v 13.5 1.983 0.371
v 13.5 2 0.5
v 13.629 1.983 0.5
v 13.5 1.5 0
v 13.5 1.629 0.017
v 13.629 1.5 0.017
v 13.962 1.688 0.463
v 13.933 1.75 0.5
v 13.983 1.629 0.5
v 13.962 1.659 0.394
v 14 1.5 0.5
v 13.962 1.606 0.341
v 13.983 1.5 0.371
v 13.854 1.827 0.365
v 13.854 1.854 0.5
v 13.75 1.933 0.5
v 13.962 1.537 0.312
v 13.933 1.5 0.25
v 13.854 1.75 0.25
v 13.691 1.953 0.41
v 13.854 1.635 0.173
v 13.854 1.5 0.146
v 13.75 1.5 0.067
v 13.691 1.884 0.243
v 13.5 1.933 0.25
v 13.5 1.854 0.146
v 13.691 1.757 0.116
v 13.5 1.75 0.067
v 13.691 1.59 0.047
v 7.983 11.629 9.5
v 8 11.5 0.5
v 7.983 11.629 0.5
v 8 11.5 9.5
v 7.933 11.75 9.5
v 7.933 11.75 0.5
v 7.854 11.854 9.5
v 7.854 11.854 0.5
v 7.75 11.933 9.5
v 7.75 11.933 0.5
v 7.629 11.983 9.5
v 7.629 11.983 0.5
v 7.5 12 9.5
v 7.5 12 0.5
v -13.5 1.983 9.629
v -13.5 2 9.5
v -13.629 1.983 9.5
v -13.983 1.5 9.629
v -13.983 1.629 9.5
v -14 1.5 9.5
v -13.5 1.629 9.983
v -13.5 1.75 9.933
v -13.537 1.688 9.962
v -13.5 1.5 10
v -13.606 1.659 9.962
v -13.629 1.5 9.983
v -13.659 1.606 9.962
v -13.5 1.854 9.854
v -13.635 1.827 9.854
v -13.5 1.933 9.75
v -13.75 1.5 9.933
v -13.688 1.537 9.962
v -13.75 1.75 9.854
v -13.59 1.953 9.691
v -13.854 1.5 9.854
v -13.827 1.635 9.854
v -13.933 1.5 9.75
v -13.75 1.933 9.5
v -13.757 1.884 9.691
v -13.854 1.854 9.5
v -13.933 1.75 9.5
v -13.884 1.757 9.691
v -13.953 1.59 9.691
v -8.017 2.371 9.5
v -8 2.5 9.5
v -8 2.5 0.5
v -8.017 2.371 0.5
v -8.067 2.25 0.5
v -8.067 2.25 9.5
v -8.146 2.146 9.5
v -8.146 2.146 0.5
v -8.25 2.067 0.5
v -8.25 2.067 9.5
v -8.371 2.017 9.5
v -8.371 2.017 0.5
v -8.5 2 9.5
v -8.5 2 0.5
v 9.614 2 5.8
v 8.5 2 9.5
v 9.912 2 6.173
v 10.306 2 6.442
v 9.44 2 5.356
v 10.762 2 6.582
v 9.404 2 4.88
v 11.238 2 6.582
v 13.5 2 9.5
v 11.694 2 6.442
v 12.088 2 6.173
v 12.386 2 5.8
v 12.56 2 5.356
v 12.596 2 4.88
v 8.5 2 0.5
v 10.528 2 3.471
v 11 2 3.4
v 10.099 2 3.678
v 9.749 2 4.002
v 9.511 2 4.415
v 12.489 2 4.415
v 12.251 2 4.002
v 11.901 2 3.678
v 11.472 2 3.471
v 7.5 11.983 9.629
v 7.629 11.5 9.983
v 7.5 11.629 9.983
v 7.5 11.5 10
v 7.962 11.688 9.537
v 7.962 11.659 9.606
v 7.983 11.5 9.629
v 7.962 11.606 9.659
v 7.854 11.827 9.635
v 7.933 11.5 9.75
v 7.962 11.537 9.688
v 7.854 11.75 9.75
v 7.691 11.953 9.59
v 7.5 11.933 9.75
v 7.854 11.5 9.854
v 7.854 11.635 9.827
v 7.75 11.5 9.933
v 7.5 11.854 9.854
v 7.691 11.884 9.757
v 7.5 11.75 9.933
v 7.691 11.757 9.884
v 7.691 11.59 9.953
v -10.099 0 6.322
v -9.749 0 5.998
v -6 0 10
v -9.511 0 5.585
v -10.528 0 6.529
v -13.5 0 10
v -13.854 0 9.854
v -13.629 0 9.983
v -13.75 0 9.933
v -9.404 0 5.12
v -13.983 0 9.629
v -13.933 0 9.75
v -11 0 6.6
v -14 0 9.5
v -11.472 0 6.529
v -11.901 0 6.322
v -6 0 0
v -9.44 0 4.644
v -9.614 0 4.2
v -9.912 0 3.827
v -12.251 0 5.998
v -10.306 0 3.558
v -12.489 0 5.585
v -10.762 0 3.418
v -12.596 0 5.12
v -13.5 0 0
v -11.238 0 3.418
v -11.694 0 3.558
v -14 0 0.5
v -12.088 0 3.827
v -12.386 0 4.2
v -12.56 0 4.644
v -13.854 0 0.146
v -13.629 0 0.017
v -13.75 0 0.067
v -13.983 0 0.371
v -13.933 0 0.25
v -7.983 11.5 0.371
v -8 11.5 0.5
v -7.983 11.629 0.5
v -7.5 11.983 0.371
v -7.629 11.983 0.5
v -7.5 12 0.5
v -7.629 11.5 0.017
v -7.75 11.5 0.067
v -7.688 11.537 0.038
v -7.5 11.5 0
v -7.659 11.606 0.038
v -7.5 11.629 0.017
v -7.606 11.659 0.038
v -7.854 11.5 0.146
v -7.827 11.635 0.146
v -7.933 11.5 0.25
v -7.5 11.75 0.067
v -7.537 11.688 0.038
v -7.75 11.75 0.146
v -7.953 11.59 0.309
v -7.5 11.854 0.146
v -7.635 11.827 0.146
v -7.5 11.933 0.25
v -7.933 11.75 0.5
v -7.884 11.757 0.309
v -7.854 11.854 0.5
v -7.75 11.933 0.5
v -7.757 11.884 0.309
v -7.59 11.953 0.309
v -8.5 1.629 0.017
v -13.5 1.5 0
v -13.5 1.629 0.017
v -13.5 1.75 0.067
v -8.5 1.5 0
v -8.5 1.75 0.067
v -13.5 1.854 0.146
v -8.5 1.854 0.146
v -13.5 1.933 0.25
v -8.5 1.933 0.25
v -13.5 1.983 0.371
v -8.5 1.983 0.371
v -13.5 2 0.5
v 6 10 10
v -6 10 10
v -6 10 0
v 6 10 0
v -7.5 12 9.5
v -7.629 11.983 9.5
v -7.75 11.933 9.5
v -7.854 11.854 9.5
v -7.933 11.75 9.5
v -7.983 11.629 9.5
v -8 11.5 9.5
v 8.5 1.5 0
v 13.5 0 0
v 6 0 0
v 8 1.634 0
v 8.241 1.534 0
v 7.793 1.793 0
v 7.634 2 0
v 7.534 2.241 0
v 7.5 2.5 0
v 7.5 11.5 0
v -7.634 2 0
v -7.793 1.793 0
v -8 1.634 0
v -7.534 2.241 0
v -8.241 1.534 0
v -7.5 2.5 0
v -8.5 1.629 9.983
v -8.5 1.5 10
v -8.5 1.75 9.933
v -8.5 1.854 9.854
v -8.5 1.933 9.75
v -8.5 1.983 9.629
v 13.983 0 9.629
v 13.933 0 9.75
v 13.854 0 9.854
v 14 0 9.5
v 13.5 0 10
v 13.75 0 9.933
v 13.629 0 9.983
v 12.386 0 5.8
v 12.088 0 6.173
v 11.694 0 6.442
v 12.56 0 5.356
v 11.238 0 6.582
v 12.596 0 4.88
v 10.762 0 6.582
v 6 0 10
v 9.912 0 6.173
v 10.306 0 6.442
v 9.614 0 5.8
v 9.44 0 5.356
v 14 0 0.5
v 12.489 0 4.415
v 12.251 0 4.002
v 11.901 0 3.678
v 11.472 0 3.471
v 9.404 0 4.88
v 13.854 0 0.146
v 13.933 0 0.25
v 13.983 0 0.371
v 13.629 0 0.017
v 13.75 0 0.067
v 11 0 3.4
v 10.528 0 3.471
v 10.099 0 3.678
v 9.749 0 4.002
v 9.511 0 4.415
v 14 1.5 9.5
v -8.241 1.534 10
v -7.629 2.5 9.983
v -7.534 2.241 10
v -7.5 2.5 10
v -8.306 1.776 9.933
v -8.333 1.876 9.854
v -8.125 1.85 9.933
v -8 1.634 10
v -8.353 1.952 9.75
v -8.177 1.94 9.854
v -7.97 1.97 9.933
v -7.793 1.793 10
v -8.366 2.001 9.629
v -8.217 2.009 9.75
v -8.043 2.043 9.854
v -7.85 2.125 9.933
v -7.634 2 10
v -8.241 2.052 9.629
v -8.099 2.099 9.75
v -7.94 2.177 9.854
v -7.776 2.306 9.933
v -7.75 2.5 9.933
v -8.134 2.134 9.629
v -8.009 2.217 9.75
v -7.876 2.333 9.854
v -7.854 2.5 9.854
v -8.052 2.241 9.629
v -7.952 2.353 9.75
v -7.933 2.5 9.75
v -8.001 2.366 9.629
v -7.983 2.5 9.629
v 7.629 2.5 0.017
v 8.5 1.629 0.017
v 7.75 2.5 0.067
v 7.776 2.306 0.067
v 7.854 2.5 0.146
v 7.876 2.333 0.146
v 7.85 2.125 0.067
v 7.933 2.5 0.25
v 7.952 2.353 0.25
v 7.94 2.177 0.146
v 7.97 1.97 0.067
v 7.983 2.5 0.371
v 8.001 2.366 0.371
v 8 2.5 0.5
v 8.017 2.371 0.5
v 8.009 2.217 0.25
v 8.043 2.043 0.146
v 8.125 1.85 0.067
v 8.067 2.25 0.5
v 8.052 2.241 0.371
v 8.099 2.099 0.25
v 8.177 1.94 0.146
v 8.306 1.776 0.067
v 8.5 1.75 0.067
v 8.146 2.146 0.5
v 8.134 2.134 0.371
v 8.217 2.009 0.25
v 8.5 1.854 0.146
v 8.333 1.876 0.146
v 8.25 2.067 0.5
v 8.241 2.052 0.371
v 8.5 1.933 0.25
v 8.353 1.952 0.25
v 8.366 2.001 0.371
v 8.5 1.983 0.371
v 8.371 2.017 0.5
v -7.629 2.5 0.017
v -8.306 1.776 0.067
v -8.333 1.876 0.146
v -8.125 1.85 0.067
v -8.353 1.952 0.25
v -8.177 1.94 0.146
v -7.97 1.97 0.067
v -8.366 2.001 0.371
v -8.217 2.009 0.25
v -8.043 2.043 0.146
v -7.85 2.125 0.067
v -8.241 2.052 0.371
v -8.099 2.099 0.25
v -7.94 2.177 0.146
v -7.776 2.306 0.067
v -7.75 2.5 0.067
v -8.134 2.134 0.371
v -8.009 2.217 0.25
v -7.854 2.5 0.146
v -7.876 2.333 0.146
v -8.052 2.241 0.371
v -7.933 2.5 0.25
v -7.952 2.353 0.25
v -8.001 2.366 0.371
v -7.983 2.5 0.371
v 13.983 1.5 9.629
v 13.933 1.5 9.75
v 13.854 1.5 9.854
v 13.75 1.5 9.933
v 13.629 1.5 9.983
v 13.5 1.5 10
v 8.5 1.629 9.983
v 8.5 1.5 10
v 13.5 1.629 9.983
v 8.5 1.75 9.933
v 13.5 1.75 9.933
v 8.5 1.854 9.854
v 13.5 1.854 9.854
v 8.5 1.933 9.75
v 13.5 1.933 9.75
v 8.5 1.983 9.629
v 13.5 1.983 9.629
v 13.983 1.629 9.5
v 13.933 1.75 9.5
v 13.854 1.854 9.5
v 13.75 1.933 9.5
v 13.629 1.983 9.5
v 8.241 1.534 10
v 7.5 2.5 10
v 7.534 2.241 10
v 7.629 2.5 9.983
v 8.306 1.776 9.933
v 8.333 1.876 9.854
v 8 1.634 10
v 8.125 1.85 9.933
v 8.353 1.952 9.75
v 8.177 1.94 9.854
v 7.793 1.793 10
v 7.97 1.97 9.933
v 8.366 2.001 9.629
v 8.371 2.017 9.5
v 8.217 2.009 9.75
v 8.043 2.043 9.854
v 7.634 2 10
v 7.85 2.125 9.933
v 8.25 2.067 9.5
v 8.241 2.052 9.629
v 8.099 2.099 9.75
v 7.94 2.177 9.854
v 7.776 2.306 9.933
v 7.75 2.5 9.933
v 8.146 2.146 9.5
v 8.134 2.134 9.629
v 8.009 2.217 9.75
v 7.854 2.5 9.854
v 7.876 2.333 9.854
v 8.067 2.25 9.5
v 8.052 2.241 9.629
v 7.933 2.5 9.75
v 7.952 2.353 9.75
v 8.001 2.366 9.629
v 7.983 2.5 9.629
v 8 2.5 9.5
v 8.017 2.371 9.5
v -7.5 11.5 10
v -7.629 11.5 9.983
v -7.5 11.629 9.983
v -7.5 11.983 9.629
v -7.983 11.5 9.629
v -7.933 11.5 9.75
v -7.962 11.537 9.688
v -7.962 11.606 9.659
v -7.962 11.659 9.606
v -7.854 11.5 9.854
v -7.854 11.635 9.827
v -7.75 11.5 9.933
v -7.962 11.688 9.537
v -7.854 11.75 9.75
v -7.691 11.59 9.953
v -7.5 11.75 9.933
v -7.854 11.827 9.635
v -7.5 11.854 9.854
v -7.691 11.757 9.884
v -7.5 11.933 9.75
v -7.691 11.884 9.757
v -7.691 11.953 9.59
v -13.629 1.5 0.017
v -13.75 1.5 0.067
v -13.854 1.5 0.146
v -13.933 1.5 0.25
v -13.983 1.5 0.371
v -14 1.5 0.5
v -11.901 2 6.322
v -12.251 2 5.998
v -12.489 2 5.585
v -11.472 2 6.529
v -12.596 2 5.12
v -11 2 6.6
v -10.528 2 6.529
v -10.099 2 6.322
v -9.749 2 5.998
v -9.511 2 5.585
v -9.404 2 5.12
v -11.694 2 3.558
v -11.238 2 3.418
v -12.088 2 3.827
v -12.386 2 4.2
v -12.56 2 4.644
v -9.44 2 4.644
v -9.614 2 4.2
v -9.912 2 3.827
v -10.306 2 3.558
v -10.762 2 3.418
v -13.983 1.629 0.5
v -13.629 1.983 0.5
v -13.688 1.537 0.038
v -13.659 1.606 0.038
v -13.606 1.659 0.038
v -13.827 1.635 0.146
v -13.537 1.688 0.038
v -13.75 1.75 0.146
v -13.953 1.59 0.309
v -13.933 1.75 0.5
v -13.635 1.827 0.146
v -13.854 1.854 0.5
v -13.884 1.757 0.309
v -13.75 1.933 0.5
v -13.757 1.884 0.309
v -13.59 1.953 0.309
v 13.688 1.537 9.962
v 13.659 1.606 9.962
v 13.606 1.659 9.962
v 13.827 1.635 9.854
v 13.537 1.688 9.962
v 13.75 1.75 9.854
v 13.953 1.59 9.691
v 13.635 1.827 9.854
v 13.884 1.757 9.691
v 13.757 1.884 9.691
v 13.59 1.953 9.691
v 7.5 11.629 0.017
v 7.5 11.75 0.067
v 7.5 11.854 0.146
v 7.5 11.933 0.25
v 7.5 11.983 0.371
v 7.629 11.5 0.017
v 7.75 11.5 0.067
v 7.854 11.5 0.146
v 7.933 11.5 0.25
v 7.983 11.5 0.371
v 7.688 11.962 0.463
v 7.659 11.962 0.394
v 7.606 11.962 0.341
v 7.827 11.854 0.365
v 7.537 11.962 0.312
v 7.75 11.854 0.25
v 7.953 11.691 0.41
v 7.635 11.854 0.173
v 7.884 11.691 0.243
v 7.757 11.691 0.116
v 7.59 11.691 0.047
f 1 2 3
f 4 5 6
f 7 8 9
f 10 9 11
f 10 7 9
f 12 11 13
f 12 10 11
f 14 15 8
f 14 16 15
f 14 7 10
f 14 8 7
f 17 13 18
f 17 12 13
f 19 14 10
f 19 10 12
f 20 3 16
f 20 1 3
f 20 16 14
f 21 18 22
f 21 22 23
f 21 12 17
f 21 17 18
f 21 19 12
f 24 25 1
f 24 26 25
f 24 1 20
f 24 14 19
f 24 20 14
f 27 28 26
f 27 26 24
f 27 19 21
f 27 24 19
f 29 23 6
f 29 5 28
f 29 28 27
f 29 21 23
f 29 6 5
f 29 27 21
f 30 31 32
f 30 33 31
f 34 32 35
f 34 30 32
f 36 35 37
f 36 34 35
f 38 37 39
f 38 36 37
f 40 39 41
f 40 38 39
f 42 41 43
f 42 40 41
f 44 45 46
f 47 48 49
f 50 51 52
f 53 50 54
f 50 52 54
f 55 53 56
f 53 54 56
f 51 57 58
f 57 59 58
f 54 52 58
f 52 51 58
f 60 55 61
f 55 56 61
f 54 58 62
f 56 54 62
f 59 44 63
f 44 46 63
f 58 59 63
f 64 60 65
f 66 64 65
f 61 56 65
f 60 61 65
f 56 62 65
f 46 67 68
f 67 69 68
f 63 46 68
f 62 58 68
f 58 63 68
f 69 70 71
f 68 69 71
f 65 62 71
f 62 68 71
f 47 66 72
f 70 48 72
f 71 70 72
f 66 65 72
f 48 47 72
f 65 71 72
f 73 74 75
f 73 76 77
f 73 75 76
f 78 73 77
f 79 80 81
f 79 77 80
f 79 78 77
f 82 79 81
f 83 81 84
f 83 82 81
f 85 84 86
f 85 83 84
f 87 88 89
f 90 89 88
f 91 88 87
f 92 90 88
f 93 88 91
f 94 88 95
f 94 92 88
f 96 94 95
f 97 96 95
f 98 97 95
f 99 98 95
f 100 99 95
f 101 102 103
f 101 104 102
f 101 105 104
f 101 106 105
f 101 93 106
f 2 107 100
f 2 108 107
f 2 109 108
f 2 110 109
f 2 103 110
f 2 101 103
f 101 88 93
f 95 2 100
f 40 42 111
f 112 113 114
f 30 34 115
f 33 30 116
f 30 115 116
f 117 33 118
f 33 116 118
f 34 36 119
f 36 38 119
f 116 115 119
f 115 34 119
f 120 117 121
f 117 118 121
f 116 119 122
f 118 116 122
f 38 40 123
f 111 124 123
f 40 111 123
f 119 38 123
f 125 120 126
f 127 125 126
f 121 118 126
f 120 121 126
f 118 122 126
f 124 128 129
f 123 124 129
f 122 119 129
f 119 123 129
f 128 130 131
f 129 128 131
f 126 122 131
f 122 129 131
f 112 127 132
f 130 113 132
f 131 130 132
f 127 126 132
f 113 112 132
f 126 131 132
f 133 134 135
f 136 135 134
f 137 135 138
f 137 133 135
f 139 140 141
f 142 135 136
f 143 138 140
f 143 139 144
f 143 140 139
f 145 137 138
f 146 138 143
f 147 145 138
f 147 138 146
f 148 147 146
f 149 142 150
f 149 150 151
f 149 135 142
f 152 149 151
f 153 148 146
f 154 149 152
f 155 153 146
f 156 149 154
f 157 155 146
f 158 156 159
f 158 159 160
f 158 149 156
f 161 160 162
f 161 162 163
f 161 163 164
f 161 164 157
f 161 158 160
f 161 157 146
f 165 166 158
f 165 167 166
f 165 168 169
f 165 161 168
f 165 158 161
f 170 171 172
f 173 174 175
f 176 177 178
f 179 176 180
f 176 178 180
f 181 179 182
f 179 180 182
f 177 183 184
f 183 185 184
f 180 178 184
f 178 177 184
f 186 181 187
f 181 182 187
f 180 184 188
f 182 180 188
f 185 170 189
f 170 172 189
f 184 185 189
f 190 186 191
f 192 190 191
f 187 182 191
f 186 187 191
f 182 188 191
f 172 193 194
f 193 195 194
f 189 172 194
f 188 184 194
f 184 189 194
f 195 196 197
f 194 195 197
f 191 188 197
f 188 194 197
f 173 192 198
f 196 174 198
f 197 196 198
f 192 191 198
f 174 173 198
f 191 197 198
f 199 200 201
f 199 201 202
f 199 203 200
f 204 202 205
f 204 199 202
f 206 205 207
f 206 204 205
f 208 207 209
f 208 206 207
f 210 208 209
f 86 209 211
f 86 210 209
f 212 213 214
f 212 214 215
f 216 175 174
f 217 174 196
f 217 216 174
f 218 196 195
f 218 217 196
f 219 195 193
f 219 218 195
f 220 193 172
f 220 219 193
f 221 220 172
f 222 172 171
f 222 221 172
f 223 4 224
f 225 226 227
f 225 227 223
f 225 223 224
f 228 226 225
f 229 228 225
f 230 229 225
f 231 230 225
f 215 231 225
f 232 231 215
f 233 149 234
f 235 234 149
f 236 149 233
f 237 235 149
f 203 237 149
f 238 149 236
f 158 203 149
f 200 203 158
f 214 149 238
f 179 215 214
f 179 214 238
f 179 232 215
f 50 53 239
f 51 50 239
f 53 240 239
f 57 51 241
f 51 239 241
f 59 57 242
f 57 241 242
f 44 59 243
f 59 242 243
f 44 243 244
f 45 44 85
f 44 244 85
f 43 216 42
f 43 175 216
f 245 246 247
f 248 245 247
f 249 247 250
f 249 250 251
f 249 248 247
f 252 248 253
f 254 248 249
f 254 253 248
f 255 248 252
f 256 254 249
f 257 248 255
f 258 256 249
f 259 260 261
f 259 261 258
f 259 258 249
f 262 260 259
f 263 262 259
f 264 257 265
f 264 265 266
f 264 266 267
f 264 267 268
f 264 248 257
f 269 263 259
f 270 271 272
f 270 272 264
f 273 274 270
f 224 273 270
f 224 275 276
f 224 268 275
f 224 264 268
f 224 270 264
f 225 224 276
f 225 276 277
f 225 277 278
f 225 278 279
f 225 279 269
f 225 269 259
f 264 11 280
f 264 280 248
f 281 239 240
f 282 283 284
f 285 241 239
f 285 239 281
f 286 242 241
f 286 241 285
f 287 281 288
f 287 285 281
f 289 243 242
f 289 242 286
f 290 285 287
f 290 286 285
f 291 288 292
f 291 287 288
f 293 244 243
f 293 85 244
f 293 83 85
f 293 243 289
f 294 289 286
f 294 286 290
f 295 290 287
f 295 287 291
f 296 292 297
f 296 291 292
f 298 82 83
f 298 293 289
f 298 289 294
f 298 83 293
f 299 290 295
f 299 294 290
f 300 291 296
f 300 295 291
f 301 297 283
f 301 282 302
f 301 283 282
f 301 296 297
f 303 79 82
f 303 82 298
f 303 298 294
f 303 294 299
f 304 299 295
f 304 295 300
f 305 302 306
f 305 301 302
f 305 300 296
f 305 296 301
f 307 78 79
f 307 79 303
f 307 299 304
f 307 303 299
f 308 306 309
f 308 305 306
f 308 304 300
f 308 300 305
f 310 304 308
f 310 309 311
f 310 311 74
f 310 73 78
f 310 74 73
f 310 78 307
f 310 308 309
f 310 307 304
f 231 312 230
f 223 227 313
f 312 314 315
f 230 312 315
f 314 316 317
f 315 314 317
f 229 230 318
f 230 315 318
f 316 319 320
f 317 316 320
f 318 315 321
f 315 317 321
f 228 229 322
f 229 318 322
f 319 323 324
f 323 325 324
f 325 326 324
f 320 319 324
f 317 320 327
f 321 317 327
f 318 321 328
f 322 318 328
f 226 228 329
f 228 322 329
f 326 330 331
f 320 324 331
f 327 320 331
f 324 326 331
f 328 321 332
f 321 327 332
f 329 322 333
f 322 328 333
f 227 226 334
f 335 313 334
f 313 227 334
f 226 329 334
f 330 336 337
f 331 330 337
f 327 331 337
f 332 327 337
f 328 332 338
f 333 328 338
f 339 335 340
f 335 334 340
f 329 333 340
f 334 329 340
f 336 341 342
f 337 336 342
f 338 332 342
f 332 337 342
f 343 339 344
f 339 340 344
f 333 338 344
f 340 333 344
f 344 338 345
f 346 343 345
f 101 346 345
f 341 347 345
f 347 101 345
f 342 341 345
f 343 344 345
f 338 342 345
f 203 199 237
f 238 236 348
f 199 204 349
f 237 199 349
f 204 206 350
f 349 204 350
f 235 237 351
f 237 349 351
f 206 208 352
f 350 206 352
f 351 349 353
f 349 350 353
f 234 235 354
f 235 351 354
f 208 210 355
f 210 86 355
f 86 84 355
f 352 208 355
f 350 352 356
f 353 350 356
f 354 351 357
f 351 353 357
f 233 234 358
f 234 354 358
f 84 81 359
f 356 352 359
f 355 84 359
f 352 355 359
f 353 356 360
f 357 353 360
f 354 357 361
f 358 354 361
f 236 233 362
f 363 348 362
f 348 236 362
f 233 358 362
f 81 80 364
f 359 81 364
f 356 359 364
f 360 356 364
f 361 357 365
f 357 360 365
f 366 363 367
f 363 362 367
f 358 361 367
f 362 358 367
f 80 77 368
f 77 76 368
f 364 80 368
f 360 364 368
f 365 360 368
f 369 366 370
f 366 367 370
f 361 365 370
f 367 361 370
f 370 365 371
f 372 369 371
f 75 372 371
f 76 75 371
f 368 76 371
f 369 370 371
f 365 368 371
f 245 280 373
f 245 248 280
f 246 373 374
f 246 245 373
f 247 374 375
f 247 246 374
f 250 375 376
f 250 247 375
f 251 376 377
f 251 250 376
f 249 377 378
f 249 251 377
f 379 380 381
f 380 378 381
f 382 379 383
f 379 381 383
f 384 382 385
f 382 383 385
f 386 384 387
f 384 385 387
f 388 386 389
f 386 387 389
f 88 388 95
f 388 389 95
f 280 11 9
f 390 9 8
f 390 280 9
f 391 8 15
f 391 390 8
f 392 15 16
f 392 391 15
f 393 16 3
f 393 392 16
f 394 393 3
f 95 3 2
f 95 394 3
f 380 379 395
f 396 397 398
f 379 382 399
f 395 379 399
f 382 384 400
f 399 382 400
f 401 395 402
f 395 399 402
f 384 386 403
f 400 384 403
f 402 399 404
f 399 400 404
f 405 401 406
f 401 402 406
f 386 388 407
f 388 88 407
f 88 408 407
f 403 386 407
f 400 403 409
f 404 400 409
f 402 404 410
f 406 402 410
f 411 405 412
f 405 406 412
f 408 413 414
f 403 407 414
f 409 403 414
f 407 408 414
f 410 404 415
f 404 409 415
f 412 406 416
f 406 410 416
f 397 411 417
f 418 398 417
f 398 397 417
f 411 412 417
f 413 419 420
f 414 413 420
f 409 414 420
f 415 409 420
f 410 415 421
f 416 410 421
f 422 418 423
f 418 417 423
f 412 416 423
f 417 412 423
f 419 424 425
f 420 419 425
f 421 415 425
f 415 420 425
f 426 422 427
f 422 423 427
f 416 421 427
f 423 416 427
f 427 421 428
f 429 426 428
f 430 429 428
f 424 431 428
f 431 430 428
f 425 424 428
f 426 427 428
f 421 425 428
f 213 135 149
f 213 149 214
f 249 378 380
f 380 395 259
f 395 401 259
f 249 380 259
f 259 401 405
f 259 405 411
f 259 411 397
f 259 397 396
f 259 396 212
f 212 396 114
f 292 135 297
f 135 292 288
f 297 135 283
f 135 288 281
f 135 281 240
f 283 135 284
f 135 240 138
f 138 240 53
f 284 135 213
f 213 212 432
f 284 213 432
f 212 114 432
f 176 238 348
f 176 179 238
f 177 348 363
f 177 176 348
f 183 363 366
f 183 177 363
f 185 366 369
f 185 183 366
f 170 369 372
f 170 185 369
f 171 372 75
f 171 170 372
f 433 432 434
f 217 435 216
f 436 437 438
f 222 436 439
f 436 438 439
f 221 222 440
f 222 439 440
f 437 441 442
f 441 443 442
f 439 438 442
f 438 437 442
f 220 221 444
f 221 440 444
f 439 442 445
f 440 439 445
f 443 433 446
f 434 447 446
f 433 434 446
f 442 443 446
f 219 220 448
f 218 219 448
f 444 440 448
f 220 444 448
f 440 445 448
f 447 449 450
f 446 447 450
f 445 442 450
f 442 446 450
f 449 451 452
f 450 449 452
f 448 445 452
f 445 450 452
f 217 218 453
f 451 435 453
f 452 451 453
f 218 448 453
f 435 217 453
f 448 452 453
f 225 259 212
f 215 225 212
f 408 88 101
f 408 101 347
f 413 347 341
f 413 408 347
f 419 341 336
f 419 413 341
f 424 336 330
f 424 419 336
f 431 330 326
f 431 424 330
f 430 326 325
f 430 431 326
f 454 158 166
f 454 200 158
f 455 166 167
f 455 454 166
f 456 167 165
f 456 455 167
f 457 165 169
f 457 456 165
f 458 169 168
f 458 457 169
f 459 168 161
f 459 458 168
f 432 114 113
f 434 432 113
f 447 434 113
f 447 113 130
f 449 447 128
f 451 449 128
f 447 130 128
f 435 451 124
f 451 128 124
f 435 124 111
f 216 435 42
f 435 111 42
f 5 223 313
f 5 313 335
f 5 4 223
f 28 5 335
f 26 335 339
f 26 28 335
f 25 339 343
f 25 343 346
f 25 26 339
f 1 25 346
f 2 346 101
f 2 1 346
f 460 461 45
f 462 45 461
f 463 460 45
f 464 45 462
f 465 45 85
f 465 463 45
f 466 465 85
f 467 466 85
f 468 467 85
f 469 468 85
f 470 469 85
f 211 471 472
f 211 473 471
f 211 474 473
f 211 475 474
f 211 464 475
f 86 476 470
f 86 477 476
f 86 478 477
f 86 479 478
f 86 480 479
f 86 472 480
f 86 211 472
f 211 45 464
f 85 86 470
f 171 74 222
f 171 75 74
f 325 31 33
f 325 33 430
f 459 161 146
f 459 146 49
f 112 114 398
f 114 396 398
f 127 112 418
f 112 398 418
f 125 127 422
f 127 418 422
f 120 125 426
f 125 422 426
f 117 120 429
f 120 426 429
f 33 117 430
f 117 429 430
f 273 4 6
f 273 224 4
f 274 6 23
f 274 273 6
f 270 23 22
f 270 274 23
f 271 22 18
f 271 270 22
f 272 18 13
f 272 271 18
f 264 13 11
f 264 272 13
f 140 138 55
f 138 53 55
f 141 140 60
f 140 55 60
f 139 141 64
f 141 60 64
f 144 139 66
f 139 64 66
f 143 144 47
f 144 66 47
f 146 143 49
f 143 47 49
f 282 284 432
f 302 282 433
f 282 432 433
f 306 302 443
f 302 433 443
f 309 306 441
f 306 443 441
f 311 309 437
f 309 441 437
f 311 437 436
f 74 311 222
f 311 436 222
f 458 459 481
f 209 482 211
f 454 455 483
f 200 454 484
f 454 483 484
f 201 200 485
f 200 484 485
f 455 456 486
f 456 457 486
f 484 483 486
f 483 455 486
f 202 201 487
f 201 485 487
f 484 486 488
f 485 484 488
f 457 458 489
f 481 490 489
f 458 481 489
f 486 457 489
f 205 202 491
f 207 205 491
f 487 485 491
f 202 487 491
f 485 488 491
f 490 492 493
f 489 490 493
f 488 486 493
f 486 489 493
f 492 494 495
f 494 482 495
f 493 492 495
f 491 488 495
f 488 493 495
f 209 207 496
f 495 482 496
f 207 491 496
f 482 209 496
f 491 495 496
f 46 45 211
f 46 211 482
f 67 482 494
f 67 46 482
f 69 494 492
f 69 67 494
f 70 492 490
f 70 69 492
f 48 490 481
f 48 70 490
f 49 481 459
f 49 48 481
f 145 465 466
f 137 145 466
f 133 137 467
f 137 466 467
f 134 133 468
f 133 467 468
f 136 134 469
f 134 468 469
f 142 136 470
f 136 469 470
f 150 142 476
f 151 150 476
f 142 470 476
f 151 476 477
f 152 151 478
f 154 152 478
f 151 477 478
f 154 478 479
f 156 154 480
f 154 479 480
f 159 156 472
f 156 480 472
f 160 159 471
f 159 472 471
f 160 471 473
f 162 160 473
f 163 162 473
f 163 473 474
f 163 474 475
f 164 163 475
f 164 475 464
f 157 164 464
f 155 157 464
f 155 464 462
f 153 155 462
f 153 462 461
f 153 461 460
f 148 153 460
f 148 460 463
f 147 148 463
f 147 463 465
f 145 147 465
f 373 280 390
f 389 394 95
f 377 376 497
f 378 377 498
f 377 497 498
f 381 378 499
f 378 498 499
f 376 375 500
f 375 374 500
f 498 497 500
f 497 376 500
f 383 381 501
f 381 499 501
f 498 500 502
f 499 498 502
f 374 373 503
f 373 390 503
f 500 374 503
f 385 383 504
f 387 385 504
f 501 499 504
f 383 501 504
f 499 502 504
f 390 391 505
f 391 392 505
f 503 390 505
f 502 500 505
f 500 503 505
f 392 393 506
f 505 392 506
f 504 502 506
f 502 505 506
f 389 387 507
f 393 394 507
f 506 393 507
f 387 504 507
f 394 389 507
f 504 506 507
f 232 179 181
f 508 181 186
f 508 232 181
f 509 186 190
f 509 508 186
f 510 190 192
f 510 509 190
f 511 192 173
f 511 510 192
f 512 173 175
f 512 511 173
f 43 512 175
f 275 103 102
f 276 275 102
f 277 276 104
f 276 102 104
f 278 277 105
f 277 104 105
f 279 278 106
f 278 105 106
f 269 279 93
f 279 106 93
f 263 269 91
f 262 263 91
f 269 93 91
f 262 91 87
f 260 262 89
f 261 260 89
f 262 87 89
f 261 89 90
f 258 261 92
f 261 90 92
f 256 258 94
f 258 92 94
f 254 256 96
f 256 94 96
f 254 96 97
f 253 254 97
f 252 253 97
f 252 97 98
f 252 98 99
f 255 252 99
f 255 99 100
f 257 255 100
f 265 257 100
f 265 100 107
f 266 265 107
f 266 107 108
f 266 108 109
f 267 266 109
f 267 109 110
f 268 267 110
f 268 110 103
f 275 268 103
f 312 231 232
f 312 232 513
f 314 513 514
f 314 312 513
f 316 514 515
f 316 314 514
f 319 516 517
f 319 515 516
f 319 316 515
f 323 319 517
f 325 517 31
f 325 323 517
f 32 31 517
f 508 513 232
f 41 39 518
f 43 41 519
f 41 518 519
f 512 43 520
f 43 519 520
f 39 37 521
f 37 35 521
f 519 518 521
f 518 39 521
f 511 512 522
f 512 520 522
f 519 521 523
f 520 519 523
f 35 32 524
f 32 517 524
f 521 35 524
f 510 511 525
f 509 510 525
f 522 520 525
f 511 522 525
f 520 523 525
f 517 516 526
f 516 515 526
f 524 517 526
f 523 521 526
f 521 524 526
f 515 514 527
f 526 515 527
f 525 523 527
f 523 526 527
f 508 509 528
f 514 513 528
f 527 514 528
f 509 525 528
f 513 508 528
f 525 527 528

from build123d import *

# Parameters (mm, degrees)
GRUNDK_RPER_DEPTH      = 10
SKIZZE2_W              = 12
SKIZZE2_H              = 10
AUSSCHNITT_MITTE_DEPTH = 21.976176963
SKIZZE3_R              = 1.6
BOHRUNGEN_DEPTH        = 20.899748742
VERRUNDUNG1_R          = 0.5


with BuildPart() as part:
    # Skizze1 → Grundkörper (new body)
    with BuildSketch(Plane.XY):
        Polygon((14, 0), (-14, 0), (-14, 2), (-8, 2), (-8, 12), (8, 12), (8, 2), (14, 2), align=None)
    extrude(amount=GRUNDK_RPER_DEPTH)

    # Skizze2 → Ausschnitt_Mitte (cut, through all)
    with BuildSketch(Plane.XY.offset(10)):
        with Locations((0, 5)):
            Rectangle(SKIZZE2_W, SKIZZE2_H)
    extrude(amount=-AUSSCHNITT_MITTE_DEPTH, mode=Mode.SUBTRACT)

    # Skizze3 → Bohrungen (cut, through all)
    with BuildSketch(Plane(origin=(0, 2, 0), x_dir=(1, 0, 0), z_dir=(0, 1, 0))):
        with Locations(Location((-11, -5, 0), (0, 0, 270))):
            Circle(SKIZZE3_R)
        with Locations(Location((11, -5, 0), (0, 0, 90))):
            Circle(SKIZZE3_R)
    extrude(amount=-BOHRUNGEN_DEPTH, mode=Mode.SUBTRACT)

    # Verrundung1
    verrundung1_edges = [part.edges().sort_by_distance(p)[0] for p in [
        (0, 12, 10),
        (8, 7, 0),
        (11, 2, 0),
        (-8, 7, 10),
        (14, 2, 5),
        (-14, 2, 5),
        (-8, 2, 5),
        (-8, 12, 5),
        (8, 12, 5),
        (8, 2, 5),
        (-11, 2, 10),
        (-14, 1, 10),
        (14, 1, 10),
        (11, 2, 10),
        (8, 7, 10),
        (14, 1, 0),
        (-14, 1, 0),
        (-11, 2, 0),
        (-8, 7, 0),
        (0, 12, 0),
    ]]
    fillet(verrundung1_edges, radius=VERRUNDUNG1_R)


solid = part.part
